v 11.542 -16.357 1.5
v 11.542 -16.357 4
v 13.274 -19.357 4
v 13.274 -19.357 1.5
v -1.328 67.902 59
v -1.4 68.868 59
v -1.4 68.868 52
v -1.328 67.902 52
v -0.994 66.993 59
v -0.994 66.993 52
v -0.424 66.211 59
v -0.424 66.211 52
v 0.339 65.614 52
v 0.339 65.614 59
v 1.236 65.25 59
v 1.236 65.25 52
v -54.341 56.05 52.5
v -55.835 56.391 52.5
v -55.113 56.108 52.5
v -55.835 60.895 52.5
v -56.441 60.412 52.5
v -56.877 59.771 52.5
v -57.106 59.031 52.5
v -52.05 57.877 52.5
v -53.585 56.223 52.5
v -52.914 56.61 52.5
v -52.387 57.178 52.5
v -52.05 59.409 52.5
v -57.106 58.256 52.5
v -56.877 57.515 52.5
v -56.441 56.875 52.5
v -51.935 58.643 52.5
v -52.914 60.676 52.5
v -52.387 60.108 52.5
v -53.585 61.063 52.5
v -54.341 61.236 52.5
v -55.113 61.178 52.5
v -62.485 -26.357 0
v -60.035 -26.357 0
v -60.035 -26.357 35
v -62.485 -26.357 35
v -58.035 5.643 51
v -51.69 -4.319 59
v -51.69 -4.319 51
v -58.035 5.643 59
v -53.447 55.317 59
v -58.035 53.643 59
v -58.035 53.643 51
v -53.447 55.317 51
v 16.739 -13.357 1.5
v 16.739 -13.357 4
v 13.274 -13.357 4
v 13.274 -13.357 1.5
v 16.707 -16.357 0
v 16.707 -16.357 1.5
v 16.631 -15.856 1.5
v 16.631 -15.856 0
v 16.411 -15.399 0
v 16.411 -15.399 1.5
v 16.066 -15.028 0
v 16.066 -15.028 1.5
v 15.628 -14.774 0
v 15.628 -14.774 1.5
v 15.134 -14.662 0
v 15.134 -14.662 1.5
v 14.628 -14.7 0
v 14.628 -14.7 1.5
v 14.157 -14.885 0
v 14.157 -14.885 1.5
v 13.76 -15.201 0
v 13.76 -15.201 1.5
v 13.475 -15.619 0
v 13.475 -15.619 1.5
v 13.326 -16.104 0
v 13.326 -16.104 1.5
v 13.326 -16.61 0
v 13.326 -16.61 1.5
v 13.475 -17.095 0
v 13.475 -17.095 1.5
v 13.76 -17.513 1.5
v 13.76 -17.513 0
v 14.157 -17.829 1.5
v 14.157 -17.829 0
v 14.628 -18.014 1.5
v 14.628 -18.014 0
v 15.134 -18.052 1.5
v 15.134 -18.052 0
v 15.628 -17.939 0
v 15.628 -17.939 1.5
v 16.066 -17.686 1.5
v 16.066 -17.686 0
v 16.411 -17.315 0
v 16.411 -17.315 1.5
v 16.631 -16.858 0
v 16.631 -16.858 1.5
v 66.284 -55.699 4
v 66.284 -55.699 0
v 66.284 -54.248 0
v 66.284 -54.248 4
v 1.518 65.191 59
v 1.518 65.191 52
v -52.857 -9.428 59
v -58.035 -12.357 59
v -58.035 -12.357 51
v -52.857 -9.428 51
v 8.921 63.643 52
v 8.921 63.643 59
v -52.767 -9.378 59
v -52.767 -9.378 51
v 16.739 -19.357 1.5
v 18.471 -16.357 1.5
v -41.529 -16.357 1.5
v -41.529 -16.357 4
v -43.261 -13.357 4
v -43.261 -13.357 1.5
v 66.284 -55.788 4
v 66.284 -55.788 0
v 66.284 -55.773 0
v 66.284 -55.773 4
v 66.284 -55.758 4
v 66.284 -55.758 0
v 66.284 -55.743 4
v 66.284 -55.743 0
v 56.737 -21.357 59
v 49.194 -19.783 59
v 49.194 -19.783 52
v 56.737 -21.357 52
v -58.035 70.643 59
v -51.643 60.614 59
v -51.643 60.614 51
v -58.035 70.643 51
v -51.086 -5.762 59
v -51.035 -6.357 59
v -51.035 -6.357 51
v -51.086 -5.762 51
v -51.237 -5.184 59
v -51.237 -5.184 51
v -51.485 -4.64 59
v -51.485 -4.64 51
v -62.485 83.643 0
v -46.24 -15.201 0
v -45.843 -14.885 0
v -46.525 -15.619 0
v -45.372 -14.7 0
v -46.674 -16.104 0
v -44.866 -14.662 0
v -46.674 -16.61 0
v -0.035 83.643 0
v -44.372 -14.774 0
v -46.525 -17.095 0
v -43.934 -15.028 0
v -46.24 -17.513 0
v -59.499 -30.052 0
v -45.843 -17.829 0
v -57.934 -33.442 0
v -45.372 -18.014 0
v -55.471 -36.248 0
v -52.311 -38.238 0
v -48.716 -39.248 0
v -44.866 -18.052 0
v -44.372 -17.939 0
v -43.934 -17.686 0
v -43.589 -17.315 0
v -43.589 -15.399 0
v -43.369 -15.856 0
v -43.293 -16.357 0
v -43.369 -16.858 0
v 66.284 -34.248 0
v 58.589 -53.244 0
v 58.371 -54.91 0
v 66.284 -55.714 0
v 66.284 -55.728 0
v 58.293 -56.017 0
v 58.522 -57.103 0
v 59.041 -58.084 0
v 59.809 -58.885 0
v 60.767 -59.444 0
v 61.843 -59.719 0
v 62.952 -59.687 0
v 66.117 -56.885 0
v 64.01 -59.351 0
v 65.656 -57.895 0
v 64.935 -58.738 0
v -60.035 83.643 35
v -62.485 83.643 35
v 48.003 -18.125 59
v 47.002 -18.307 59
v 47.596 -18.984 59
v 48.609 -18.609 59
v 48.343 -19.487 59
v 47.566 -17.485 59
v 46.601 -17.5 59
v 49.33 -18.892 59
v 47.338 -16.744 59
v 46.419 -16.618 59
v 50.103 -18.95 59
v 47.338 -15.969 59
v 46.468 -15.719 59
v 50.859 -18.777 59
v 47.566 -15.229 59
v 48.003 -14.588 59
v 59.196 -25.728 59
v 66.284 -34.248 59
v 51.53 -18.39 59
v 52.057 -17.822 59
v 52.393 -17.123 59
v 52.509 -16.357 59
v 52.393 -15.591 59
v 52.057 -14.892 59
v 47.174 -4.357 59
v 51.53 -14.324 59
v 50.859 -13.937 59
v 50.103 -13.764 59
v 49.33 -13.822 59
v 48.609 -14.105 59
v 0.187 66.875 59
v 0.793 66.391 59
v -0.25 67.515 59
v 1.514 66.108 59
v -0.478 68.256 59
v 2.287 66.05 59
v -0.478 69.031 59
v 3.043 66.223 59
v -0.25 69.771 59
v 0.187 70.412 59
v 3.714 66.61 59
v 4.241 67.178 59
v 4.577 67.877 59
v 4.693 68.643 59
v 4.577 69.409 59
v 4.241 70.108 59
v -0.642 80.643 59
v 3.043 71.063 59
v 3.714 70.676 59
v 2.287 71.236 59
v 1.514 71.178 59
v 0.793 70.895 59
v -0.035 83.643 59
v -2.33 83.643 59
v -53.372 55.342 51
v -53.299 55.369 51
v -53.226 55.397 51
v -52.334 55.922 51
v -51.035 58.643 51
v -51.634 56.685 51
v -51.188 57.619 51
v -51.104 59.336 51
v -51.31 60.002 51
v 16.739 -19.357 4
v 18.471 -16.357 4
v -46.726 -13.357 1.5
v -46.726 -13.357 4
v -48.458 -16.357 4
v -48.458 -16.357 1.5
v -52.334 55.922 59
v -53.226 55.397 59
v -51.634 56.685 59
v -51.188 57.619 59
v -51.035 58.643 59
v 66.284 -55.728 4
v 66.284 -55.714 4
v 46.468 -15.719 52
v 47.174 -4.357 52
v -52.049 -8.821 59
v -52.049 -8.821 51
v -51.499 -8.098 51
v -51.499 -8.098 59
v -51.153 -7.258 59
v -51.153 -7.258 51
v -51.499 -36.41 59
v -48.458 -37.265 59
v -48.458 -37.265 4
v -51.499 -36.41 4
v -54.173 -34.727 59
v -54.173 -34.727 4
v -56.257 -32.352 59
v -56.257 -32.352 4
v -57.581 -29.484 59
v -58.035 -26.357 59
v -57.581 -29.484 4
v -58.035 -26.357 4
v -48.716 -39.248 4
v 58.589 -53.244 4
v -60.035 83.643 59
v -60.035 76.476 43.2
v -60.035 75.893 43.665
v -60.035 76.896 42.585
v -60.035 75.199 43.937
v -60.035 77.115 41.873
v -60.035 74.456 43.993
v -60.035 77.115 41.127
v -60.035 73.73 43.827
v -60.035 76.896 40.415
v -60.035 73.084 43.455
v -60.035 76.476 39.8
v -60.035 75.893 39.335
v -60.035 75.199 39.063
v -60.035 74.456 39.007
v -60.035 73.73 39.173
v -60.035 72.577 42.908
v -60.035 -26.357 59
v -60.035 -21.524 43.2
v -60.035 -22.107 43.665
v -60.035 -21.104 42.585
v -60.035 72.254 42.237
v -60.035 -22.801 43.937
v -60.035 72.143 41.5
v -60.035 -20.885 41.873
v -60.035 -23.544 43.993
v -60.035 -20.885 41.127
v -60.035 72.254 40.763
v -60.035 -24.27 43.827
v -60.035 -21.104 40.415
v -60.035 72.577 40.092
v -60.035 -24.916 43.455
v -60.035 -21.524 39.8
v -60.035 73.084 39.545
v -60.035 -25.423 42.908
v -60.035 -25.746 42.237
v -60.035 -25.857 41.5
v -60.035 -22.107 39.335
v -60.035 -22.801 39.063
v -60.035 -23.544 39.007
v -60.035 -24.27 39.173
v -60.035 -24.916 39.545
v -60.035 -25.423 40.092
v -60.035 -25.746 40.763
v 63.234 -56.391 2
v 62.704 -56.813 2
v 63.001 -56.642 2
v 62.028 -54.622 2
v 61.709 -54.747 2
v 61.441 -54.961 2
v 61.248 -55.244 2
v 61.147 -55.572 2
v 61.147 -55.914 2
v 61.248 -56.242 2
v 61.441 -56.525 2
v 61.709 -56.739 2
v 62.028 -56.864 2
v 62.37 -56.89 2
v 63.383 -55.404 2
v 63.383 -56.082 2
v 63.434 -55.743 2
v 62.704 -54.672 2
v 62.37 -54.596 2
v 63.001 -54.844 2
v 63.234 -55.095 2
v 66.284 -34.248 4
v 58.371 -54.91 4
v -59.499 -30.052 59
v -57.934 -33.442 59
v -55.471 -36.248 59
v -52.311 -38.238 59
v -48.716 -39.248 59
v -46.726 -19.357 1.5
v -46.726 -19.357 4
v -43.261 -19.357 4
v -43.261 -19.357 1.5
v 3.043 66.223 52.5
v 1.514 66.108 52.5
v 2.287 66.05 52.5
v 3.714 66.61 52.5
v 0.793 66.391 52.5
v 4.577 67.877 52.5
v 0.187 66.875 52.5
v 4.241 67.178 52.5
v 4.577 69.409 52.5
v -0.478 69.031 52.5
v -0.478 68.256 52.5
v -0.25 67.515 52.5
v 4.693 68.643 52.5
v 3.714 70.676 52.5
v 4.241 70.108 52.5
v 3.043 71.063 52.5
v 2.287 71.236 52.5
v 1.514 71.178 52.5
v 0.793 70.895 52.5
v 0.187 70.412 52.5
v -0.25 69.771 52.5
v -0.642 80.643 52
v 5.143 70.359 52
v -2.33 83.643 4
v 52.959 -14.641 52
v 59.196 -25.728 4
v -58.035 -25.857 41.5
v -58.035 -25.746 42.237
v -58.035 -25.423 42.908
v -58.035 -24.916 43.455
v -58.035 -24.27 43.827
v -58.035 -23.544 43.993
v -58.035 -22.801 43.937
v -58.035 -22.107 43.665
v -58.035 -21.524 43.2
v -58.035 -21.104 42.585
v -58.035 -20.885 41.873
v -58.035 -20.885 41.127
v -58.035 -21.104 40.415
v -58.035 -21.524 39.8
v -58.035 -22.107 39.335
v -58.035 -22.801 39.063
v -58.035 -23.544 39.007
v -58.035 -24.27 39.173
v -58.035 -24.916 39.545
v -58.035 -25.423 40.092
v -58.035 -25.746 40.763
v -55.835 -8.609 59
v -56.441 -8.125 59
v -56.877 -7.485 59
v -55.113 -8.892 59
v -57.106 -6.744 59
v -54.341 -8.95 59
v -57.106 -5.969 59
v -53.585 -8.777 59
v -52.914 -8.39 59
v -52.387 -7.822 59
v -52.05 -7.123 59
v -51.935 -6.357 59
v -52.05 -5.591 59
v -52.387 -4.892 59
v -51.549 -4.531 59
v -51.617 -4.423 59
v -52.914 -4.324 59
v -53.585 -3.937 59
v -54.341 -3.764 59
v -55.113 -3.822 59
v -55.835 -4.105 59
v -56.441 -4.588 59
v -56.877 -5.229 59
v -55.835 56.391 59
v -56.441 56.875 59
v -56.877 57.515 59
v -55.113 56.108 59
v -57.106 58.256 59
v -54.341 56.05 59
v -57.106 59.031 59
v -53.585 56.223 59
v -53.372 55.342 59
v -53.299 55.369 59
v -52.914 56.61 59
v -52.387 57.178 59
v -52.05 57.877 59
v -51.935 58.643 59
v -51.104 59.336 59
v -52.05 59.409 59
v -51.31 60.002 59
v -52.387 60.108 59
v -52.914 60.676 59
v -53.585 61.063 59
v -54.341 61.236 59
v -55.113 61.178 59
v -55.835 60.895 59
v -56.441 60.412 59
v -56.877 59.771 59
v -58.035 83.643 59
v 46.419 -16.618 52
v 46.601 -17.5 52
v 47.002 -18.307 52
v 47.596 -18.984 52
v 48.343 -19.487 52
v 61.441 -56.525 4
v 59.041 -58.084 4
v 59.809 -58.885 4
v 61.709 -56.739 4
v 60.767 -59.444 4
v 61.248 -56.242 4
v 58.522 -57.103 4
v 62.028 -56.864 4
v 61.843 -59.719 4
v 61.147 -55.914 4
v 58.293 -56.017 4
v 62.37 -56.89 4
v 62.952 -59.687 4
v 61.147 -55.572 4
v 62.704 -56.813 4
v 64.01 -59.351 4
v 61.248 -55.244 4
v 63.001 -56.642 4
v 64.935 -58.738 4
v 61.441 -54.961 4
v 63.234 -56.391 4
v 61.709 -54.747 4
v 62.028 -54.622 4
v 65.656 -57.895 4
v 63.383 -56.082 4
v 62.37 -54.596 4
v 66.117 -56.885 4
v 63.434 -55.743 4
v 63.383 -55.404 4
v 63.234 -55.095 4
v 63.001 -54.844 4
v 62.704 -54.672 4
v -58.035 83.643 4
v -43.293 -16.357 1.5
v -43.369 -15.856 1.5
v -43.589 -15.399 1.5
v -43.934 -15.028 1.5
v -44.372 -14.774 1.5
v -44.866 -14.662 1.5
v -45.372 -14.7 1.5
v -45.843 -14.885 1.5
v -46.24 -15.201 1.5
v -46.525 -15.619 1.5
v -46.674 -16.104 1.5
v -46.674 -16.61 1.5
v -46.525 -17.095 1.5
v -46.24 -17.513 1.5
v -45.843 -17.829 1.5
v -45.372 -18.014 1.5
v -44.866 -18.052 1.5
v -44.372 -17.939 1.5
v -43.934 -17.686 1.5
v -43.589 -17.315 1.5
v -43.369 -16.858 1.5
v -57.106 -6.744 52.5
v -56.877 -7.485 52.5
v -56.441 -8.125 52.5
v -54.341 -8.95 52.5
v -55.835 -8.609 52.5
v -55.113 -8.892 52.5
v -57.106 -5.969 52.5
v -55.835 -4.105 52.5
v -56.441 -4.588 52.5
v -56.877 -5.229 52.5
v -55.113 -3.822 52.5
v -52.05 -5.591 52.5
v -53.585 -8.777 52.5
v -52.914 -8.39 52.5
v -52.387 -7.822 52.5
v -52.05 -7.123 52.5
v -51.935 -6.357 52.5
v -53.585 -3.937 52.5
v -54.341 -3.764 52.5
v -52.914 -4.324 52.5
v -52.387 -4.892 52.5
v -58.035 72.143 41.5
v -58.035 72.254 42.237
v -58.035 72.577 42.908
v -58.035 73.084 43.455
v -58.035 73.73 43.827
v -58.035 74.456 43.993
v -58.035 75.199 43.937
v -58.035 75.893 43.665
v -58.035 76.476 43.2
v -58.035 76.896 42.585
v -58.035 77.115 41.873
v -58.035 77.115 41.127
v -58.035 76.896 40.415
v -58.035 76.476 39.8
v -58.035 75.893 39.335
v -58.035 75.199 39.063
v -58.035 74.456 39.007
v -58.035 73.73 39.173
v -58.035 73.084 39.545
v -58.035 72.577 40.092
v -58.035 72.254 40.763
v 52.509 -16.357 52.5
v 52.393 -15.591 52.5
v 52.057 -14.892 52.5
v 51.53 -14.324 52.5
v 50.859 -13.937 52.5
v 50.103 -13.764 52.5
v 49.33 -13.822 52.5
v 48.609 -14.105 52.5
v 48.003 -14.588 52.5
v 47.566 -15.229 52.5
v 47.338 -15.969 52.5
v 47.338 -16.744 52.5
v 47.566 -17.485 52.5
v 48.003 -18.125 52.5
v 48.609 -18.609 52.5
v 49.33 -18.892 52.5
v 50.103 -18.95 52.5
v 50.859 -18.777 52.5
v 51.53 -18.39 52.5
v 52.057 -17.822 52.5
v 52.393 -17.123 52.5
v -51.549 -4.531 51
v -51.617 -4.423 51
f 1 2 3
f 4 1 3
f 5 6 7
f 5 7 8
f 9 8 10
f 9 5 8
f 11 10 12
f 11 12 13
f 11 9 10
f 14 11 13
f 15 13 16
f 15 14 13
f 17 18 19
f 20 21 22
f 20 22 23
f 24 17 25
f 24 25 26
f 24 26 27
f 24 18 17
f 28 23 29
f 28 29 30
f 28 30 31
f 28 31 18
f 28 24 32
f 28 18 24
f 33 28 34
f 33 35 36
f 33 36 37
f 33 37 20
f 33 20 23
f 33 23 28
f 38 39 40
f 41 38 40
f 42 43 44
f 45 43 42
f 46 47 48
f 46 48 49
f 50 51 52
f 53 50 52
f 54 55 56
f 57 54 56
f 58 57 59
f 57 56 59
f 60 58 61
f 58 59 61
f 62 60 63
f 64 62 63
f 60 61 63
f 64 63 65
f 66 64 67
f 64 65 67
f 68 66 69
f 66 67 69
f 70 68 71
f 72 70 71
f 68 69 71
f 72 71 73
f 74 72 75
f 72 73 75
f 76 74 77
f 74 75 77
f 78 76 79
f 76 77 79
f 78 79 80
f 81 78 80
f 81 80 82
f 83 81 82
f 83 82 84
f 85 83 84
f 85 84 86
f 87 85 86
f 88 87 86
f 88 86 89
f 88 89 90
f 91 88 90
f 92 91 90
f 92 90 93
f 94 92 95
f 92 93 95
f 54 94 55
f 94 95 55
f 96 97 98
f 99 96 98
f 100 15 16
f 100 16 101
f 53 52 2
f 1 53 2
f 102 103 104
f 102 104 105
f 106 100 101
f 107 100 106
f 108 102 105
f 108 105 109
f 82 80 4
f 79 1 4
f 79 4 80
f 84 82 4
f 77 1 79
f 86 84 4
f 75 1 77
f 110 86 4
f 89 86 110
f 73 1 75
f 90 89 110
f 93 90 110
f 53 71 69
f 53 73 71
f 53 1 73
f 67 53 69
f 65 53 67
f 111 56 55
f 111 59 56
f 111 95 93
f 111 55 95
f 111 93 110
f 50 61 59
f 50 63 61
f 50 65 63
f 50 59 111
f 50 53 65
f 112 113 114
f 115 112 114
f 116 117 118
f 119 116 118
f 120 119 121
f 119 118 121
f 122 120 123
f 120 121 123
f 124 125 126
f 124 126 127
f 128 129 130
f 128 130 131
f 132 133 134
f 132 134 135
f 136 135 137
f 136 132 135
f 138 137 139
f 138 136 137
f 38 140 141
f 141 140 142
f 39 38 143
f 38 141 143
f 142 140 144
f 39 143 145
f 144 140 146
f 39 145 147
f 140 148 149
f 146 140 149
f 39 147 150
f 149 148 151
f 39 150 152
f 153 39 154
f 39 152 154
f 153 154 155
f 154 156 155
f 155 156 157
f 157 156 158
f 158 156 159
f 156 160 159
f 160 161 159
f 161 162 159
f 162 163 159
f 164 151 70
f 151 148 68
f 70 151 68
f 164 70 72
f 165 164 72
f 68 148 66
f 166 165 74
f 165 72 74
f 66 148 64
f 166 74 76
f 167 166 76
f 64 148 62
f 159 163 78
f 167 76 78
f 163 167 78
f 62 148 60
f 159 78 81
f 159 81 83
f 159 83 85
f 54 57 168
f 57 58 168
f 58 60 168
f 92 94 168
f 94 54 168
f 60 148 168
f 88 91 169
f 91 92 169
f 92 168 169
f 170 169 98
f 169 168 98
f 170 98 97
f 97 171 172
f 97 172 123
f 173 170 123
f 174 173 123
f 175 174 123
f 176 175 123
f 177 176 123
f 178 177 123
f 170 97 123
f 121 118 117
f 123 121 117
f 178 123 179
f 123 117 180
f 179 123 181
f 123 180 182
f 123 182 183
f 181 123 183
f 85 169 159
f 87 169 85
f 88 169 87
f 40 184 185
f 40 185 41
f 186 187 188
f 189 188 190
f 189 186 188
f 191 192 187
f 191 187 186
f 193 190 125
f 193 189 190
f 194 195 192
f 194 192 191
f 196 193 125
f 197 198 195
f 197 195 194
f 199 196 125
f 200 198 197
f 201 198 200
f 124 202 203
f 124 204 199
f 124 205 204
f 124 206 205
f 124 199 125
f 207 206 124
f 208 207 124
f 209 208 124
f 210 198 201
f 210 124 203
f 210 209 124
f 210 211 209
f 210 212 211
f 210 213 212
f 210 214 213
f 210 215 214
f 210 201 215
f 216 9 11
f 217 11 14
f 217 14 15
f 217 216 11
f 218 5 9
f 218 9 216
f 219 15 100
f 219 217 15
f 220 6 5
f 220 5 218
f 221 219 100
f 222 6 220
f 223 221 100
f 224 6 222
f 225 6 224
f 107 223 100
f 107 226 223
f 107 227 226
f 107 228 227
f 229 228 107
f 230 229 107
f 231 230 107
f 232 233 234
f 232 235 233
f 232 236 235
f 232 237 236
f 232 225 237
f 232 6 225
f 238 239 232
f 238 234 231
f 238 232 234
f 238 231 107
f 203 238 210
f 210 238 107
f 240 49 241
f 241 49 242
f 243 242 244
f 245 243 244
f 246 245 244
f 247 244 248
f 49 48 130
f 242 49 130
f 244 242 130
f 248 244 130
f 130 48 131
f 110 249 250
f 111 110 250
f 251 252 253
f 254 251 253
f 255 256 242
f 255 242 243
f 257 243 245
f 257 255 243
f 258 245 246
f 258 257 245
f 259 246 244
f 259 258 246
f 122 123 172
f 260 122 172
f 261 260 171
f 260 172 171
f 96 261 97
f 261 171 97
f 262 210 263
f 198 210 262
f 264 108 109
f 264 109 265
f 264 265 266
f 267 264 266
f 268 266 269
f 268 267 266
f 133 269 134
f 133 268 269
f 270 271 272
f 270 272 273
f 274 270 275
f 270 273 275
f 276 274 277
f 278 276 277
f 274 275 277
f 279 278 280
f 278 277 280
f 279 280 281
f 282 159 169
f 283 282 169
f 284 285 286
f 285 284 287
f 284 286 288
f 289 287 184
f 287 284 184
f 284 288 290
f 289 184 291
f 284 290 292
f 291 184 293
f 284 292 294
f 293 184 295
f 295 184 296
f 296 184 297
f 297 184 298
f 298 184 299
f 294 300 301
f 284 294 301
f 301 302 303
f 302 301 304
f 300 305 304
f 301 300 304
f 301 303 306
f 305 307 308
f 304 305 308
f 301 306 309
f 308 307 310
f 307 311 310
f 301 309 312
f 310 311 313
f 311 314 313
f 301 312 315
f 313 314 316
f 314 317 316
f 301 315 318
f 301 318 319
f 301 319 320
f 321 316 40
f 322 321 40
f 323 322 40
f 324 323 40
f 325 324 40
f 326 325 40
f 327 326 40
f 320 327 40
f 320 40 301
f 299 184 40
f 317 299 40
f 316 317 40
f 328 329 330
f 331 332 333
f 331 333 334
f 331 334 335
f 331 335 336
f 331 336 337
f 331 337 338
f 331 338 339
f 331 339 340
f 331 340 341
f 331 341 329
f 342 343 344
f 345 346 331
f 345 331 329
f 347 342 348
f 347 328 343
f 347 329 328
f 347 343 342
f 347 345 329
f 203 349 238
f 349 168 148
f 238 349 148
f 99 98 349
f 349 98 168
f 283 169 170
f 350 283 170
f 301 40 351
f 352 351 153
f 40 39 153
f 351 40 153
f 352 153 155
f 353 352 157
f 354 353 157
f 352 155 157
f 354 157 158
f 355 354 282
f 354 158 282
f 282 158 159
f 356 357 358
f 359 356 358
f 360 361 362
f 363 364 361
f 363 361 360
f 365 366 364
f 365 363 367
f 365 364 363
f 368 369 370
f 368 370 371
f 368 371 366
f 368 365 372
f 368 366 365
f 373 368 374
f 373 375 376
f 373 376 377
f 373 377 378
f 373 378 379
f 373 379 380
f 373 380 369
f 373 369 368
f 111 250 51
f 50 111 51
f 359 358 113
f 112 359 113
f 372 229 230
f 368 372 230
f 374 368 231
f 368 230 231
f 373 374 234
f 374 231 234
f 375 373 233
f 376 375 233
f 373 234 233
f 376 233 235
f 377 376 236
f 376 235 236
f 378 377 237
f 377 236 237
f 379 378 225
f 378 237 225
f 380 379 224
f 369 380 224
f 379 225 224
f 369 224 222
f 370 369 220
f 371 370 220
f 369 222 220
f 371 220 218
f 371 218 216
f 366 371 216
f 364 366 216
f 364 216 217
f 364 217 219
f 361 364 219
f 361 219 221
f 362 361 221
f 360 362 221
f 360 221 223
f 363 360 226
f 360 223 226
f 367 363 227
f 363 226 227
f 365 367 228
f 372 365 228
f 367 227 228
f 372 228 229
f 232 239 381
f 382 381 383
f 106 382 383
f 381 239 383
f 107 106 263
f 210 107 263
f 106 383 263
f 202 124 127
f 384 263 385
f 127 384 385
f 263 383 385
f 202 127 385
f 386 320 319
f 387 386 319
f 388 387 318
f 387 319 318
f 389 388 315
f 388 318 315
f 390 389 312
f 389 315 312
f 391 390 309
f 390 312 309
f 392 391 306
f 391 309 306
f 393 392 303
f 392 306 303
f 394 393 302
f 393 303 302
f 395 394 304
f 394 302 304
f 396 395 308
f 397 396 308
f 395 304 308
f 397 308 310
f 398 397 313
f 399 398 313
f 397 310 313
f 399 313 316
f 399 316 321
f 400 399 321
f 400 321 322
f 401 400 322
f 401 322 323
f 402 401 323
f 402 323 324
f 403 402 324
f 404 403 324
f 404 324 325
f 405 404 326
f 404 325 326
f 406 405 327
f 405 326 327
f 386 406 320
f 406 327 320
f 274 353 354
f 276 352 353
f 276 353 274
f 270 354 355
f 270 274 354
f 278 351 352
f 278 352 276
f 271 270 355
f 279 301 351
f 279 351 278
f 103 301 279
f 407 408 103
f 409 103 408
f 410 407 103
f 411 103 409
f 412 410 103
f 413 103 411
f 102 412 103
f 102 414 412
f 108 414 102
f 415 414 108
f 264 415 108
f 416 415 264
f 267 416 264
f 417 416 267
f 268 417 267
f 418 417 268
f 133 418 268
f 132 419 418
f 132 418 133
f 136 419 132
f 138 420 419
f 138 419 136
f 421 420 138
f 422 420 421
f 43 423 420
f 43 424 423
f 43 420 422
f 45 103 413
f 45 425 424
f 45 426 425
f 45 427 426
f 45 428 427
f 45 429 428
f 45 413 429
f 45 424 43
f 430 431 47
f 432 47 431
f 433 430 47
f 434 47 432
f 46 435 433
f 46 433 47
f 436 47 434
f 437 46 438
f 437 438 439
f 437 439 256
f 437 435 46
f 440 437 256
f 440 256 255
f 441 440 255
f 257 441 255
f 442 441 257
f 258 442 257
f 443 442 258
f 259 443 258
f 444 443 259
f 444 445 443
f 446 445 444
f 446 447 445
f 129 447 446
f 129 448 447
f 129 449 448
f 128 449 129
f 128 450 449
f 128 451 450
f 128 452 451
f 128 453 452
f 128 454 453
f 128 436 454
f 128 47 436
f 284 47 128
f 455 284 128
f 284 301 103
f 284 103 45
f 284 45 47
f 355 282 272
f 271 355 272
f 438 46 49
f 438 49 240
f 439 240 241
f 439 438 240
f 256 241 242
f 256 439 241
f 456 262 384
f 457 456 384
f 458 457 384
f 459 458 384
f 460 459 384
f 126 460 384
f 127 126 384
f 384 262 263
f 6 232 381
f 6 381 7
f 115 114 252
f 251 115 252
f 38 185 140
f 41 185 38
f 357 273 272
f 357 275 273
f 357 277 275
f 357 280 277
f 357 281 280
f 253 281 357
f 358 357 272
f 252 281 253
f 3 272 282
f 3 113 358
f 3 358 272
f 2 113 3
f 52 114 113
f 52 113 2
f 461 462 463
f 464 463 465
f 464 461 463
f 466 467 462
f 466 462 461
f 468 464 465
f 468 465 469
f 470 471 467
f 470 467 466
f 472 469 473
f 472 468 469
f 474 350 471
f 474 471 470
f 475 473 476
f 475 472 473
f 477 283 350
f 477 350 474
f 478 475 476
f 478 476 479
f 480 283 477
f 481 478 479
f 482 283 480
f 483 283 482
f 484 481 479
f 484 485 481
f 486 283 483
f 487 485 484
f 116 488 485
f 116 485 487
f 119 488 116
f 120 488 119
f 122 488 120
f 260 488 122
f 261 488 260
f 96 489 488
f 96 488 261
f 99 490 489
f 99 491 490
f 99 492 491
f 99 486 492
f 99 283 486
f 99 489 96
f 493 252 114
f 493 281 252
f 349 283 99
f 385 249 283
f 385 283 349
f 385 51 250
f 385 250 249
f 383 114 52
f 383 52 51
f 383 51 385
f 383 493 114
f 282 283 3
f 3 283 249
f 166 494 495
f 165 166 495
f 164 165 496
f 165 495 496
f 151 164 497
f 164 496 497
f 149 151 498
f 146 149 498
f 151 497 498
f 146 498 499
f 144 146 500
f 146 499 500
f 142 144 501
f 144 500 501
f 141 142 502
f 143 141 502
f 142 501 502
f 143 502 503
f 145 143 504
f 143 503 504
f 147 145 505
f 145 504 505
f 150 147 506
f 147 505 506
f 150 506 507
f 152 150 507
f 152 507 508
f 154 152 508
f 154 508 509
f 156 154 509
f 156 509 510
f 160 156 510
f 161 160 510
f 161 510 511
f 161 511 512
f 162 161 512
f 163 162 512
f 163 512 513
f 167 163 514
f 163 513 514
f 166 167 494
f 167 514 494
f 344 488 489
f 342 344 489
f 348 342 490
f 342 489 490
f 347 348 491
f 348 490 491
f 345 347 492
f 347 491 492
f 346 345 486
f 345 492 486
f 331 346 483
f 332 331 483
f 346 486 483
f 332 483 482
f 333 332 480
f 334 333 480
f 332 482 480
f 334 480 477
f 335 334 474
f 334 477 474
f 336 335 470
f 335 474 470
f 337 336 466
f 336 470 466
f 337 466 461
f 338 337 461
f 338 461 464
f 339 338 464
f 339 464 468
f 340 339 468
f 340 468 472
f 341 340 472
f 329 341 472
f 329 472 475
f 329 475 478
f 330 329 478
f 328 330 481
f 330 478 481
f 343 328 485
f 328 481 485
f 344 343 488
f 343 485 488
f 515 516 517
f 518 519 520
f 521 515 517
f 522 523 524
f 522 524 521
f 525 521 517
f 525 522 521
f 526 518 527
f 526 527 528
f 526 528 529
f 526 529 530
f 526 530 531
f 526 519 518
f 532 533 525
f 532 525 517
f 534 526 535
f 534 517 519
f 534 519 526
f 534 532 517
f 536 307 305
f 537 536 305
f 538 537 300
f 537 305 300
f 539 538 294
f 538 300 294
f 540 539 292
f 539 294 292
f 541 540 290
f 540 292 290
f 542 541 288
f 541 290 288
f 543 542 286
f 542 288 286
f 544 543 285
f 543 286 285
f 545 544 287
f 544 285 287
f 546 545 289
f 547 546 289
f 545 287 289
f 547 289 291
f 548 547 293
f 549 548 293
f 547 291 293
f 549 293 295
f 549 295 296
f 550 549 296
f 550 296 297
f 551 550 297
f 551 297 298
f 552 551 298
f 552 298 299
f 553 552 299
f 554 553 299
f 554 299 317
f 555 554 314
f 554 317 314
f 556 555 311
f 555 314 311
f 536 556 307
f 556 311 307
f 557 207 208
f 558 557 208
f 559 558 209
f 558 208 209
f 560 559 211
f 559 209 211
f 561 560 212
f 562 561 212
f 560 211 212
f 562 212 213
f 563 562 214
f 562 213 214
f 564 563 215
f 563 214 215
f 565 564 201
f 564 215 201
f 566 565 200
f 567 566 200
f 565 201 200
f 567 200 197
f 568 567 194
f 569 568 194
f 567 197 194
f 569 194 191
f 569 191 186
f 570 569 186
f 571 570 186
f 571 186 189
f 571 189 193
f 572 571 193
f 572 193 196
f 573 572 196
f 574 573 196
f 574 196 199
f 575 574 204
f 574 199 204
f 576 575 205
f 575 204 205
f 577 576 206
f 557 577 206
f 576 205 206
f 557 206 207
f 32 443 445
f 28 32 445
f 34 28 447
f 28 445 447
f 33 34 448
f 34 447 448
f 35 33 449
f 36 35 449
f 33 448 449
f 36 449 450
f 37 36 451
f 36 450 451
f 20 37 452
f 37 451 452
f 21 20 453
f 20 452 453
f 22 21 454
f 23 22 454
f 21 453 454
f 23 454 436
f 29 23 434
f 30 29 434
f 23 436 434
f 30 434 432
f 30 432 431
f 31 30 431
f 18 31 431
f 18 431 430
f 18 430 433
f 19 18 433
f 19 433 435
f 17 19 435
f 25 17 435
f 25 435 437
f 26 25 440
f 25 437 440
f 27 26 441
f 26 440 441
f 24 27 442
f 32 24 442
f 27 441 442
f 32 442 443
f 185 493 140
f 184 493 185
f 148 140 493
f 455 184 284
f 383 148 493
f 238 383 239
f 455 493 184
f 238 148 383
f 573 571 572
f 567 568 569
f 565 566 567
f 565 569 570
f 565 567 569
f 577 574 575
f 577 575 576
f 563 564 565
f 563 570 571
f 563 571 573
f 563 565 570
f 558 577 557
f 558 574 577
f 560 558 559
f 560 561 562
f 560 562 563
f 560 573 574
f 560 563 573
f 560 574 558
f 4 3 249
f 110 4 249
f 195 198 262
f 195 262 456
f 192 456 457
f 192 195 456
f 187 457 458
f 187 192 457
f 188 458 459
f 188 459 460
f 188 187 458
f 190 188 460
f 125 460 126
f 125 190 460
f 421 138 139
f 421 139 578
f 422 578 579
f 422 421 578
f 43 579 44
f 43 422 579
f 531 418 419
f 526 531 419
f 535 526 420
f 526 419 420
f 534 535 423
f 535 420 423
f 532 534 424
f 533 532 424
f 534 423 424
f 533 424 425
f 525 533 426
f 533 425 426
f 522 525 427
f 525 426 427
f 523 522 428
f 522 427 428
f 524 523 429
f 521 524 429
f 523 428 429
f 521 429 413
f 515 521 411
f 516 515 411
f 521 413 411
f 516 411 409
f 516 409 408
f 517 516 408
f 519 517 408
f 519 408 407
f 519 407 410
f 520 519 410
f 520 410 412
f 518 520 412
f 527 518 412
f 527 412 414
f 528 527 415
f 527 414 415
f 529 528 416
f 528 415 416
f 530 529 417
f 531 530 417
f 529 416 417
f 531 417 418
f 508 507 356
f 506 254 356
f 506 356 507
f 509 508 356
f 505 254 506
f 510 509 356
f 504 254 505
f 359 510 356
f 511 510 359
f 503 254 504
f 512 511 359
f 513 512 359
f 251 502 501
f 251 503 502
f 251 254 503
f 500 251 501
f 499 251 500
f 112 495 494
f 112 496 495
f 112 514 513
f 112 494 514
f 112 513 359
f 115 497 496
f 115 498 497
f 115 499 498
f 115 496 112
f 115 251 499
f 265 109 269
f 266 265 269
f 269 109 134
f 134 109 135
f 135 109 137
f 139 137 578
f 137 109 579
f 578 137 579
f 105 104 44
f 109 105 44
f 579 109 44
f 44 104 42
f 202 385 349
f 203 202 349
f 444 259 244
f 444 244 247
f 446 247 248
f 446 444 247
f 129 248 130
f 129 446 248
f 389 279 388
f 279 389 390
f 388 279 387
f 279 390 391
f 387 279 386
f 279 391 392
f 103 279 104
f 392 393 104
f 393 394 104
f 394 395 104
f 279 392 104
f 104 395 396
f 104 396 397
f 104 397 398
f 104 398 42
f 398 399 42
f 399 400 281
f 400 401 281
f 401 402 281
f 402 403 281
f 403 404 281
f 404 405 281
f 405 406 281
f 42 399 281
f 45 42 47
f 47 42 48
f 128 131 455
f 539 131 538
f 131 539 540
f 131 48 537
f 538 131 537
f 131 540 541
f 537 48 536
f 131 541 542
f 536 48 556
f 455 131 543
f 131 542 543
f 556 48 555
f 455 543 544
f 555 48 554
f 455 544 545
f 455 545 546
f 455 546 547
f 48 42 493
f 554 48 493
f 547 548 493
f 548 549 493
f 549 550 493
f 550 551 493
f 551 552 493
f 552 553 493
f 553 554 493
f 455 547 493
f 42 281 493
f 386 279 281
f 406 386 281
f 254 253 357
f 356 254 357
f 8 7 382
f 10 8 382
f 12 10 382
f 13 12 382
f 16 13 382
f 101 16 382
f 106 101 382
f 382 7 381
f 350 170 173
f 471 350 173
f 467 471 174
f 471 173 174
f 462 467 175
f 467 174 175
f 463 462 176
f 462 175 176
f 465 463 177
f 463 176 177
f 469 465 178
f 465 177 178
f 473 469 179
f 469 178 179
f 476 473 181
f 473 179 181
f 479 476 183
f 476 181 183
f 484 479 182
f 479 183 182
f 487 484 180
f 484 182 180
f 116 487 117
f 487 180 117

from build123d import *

# Parameters (mm, degrees)
F1_DEPTH  = 4
F3_DEPTH  = 55
F4_R      = 2.5
F5_DEPTH  = 2
F6_R      = 1.15
F7_DEPTH  = 2
F9_DEPTH  = 2.5
F10_R     = 1.7
F11_DEPTH = 1.5
F12_R     = 1.7
F13_DEPTH = 1.5
F15_DEPTH = 8
F17_DEPTH = 7
F18_R     = 2.6
F19_DEPTH = 6.5
F20_R     = 2.6
F21_DEPTH = 6.5
F22_W     = 110
F22_H     = 35
F23_DEPTH = 2.45


with BuildPart() as f1:
    # F0 (on Top) → F1 (new body)
    with BuildSketch(Plane.XY):
        with BuildLine():
            Line((-0.0348270737, 83.6430855933), (-60.0348270737, 83.6430855933))
            Line((-60.0348270737, 83.6430855933), (-60.0348270737, -26.3569144067))
            ThreePointArc((-60.0348270737, -26.3569144067), (-56.8036121084, -34.9342589227), (-48.7162364666, -39.2477197521))
            Line((-48.7162364666, -39.2477197521), (58.5887347718, -53.2440203484))
            Line((58.5887347718, -53.2440203484), (59.1074373156, -53.3116772019))
            ThreePointArc((59.1074373156, -53.3116772019), (62.8011202697, -51.776520456), (65.9774464875, -54.2077653548))
            Line((65.9774464875, -54.2077653548), (66.2837635334, -54.2477197521))
            Line((66.2837635334, -54.2477197521), (66.2837635334, -34.2477197521))
            Line((66.2837635334, -34.2477197521), (-0.0348270737, 83.6430855933))
        make_face()
        with BuildLine():
            Line((59.1074373156, -53.3116772019), (58.5887347718, -53.2440203484))
            Line((58.5887347718, -53.2440203484), (58.3714151196, -54.9101376817))
            ThreePointArc((58.3714151196, -54.9101376817), (58.6504322817, -54.0699295678), (59.1074373156, -53.3116772019))
        make_face()
        with BuildLine():
            Line((66.2835221478, -55.6989786465), (66.2837635334, -54.2477197521))
            Line((66.2837635334, -54.2477197521), (65.9774464875, -54.2077653548))
            ThreePointArc((65.9774464875, -54.2077653548), (66.2020782301, -54.9386771517), (66.2835221478, -55.6989786465))
        make_face()
        with BuildLine():
            Line((65.9774464875, -54.2077653548), (59.1074373156, -53.3116772019))
            ThreePointArc((59.1074373156, -53.3116772019), (58.6504322817, -54.0699295678), (58.3714151196, -54.9101376817))
            ThreePointArc((58.3714151196, -54.9101376817), (61.8425650137, -59.7185156245), (66.2835073084, -55.7881961))
            Line((66.2835073084, -55.7881961), (66.2835221478, -55.6989786465))
            ThreePointArc((66.2835221478, -55.6989786465), (66.2020782301, -54.9386771517), (65.9774464875, -54.2077653548))
        make_face()
        with BuildLine():
            ThreePointArc((66.2837635334, -55.7429221007), (66.2837031866, -55.7209500421), (66.2835221478, -55.6989786465))
            Line((66.2835221478, -55.6989786465), (66.2835073084, -55.7881961))
            ThreePointArc((66.2835073084, -55.7881961), (66.2836994767, -55.7655594629), (66.2837635334, -55.7429221007))
        make_face()
        with BuildLine():
            ThreePointArc((65.9774464875, -54.2077653548), (62.8011202697, -51.776520456), (59.1074373156, -53.3116772019))
            Line((59.1074373156, -53.3116772019), (65.9774464875, -54.2077653548))
        make_face()
    extrude(amount=F1_DEPTH)

    # F2 (on face) → F3 (join)
    with BuildSketch(Plane.XY.offset(4)):
        with BuildLine():
            ThreePointArc((-48.4575580984, -37.2645189297), (-55.300722103, -33.6146674587), (-58.0348270737, -26.3569144067))
            Line((-58.0348270737, -26.3569144067), (-58.0348270737, 83.6430855933))
            Line((-58.0348270737, 83.6430855933), (-60.0348270737, 83.6430855933))
            Line((-60.0348270737, 83.6430855933), (-60.0348270737, -26.3569144067))
            ThreePointArc((-60.0348270737, -26.3569144067), (-56.8036121084, -34.9342589227), (-48.7162364666, -39.2477197521))
            Line((-48.7162364666, -39.2477197521), (-48.4575580984, -37.2645189297))
        make_face()
        Polygon((-0.0348270737, 83.6430855933), (-2.3295637346, 83.6430855933), (59.1961841109, -25.7277544167), (66.2837635334, -34.2477197521), align=None)
    extrude(amount=F3_DEPTH)

    # F4 (on face) → F5 (cut, through all)
    with BuildSketch(Plane(origin=(-60.0348270737, 0, 0), x_dir=(0, -1, 0), z_dir=(-1, 0, 0))):
        with Locations((23.3569144067, 41.5)):
            Circle(F4_R)
        with Locations((-74.6430855933, 41.5)):
            Circle(F4_R)
    extrude(amount=-F5_DEPTH, mode=Mode.SUBTRACT)

    # F6 (on face) → F7 (cut)
    with BuildSketch(Plane.XY.offset(4)):
        with Locations((62.2837635334, -55.7429221007)):
            Circle(F6_R)
    extrude(amount=-F7_DEPTH, mode=Mode.SUBTRACT)

    # F8 (on face) → F9 (cut)
    with BuildSketch(Plane.XY.offset(4)):
        Polygon((-43.2614056757, -13.3569144067), (-46.7255072909, -13.3569144067), (-48.4575580984, -16.3569144067), (-46.7255072909, -19.3569144067), (-43.2614056757, -19.3569144067), (-41.5293548681, -16.3569144067), align=None)
        Polygon((16.7385943243, -13.3569144067), (13.2744927091, -13.3569144067), (11.5424419016, -16.3569144067), (13.2744927091, -19.3569144067), (16.7385943243, -19.3569144067), (18.4706451319, -16.3569144067), align=None)
    extrude(amount=-F9_DEPTH, mode=Mode.SUBTRACT)

    # F10 (on face) → F11 (cut, through all)
    with BuildSketch(Plane.XY.offset(1.5)):
        with Locations((15.0065435167, -16.3569144067)):
            Circle(F10_R)
    extrude(amount=-F11_DEPTH, mode=Mode.SUBTRACT)

    # F12 (on face) → F13 (cut, through all)
    with BuildSketch(Plane.XY.offset(1.5)):
        with Locations((-44.9934564833, -16.3569144067)):
            Circle(F12_R)
    extrude(amount=-F13_DEPTH, mode=Mode.SUBTRACT)

    # F14 (on face) → F15 (join)
    with BuildSketch(Plane.XY.offset(59)):
        with BuildLine():
            ThreePointArc((-52.7673478203, -9.3778442451), (-51.4986965275, -8.0981528472), (-51.0348270737, -6.3569144067))
            ThreePointArc((-51.0348270737, -6.3569144067), (-51.1491815724, -5.4695562268), (-51.4847725248, -4.6401828467))
            Line((-51.4847725248, -4.6401828467), (-51.6896180966, -4.3185852191))
            ThreePointArc((-51.6896180966, -4.3185852191), (-55.6052868974, -3.0246305403), (-58.0348270737, -6.3569143518))
            ThreePointArc((-58.0348270737, -6.3569143518), (-56.3204013937, -9.3671842197), (-52.856698827, -9.4283775088))
            Line((-52.856698827, -9.4283775088), (-52.7673478203, -9.3778442451))
        make_face()
        with BuildLine():
            Line((-51.6896180966, -4.3185852191), (-51.4847725248, -4.6401828467))
            ThreePointArc((-51.4847725248, -4.6401828467), (-51.5828126312, -4.4765924312), (-51.6896180966, -4.3185852191))
        make_face()
        with BuildLine():
            ThreePointArc((-58.0348270737, -6.3569143518), (-55.6052868974, -3.0246305403), (-51.6896180966, -4.3185852191))
            Line((-51.6896180966, -4.3185852191), (-58.0348270737, 5.6430855933))
            Line((-58.0348270737, 5.6430855933), (-58.0348270737, -6.3569143518))
        make_face()
        with BuildLine():
            Line((-58.0348270737, -12.3569144067), (-52.856698827, -9.4283775088))
            ThreePointArc((-52.856698827, -9.4283775088), (-56.3204013937, -9.3671842197), (-58.0348270737, -6.3569143518))
            Line((-58.0348270737, -6.3569143518), (-58.0348270737, -12.3569144067))
        make_face()
        with BuildLine():
            Line((-58.0348270737, 58.6430855933), (-58.0348270737, 53.6430855933))
            Line((-58.0348270737, 53.6430855933), (-53.4465181967, 55.3165883683))
            ThreePointArc((-53.4465181967, 55.3165883683), (-56.5892027611, 55.8094412023), (-58.0348270737, 58.6430855933))
        make_face()
        with BuildLine():
            Line((-53.2259221658, 55.3970467855), (-53.4465181967, 55.3165883683))
            ThreePointArc((-53.4465181967, 55.3165883683), (-53.3355452586, 55.3549671149), (-53.2259221658, 55.3970467855))
        make_face()
        with BuildLine():
            ThreePointArc((-58.0348270737, 58.6430855933), (-56.5892027611, 55.8094412023), (-53.4465181967, 55.3165883683))
            Line((-53.4465181967, 55.3165883683), (-53.2259221658, 55.3970467855))
            ThreePointArc((-53.2259221658, 55.3970467855), (-51.6338645457, 56.684918999), (-51.0348270737, 58.6430855933))
            ThreePointArc((-51.0348270737, 58.6430855933), (-51.1902368109, 59.6744516652), (-51.6426647732, 60.6142266912))
            ThreePointArc((-51.6426647732, 60.6142266912), (-55.5661931455, 61.9876758561), (-58.0348270737, 58.6430855933))
        make_face()
        with BuildLine():
            Line((-58.0348270737, 70.6430855933), (-58.0348270737, 58.6430855933))
            ThreePointArc((-58.0348270737, 58.6430855933), (-55.5661931455, 61.9876758561), (-51.6426647732, 60.6142266912))
            Line((-51.6426647732, 60.6142266912), (-58.0348270737, 70.6430855933))
        make_face()
    extrude(amount=-F15_DEPTH)

    # F16 (on face) → F17 (join)
    with BuildSketch(Plane.XY.offset(59)):
        with BuildLine():
            ThreePointArc((5.1432437589, 70.3590986219), (1.3150969821, 72.0555922251), (-1.3999848728, 68.86793967))
            ThreePointArc((-1.3999848728, 68.86793967), (-0.7360869019, 66.5821430027), (1.236164718, 65.2495326066))
            Line((1.236164718, 65.2495326066), (1.518343575, 65.1905478063))
            ThreePointArc((1.518343575, 65.1905478063), (4.3554664208, 65.9728286191), (5.5927848941, 68.6430855933))
            ThreePointArc((5.5927848941, 68.6430855933), (5.4785348868, 69.5300449986), (5.1432437589, 70.3590986219))
        make_face()
        with BuildLine():
            Line((-0.6419361775, 80.6430855933), (-1.3999848728, 68.86793967))
            ThreePointArc((-1.3999848728, 68.86793967), (1.3150969821, 72.0555922251), (5.1432437589, 70.3590986219))
            Line((5.1432437589, 70.3590986219), (-0.6419361775, 80.6430855933))
        make_face()
        with BuildLine():
            Line((8.9212866456, 63.6430855933), (5.1432437589, 70.3590986219))
            ThreePointArc((5.1432437589, 70.3590986219), (5.4785348868, 69.5300449986), (5.5927848941, 68.6430855933))
            ThreePointArc((5.5927848941, 68.6430855933), (4.3554664208, 65.9728286191), (1.518343575, 65.1905478063))
            Line((1.518343575, 65.1905478063), (8.9212866456, 63.6430855933))
        make_face()
        with BuildLine():
            Line((52.9593578497, -14.6409013336), (47.1741779383, -4.3569144067))
            Line((47.1741779383, -4.3569144067), (46.4675691299, -15.7187540374))
            ThreePointArc((46.4675691299, -15.7187540374), (49.3356306127, -12.9041816709), (52.9593578497, -14.6409013336))
        make_face()
        with BuildLine():
            ThreePointArc((52.9593578497, -14.6409013336), (49.3356306127, -12.9041816709), (46.4675691299, -15.7187540374))
            ThreePointArc((46.4675691299, -15.7187540374), (47.0023195828, -18.3067338942), (49.1940807829, -19.7831419097))
            ThreePointArc((49.1940807829, -19.7831419097), (52.1166281832, -19.0727811002), (53.4088990099, -16.3569144067))
            ThreePointArc((53.4088990099, -16.3569144067), (53.2946489962, -15.4699549767), (52.9593578497, -14.6409013336))
        make_face()
        with BuildLine():
            Line((56.7374007615, -21.3569144067), (52.9593578497, -14.6409013336))
            ThreePointArc((52.9593578497, -14.6409013336), (53.2946489962, -15.4699549767), (53.4088990099, -16.3569144067))
            ThreePointArc((53.4088990099, -16.3569144067), (52.1166281832, -19.0727811002), (49.1940807829, -19.7831419097))
            Line((49.1940807829, -19.7831419097), (56.7374007615, -21.3569144067))
        make_face()
    extrude(amount=-F17_DEPTH)

    # F18 (on face) → F19 (cut)
    with BuildSketch(Plane.XY.offset(59)):
        with Locations((-54.5348270737, -6.3569144067)):
            Circle(F18_R)
        with Locations((-54.5348270737, 58.6430855933)):
            Circle(F18_R)
    extrude(amount=-F19_DEPTH, mode=Mode.SUBTRACT)

    # F20 (on face) → F21 (cut)
    with BuildSketch(Plane.XY.offset(59)):
        with Locations((49.9088990099, -16.3569144067)):
            Circle(F20_R)
        with Locations((2.0927848941, 68.6430855933)):
            Circle(F20_R)
    extrude(amount=-F21_DEPTH, mode=Mode.SUBTRACT)

    # F22 (on face) → F23 (join)
    with BuildSketch(Plane(origin=(-60.0348270737, 0, 0), x_dir=(0, -1, 0), z_dir=(-1, 0, 0))):
        with Locations((-28.6430855933, 17.5)):
            Rectangle(F22_W, F22_H)
    extrude(amount=F23_DEPTH)


solid = f1.part
